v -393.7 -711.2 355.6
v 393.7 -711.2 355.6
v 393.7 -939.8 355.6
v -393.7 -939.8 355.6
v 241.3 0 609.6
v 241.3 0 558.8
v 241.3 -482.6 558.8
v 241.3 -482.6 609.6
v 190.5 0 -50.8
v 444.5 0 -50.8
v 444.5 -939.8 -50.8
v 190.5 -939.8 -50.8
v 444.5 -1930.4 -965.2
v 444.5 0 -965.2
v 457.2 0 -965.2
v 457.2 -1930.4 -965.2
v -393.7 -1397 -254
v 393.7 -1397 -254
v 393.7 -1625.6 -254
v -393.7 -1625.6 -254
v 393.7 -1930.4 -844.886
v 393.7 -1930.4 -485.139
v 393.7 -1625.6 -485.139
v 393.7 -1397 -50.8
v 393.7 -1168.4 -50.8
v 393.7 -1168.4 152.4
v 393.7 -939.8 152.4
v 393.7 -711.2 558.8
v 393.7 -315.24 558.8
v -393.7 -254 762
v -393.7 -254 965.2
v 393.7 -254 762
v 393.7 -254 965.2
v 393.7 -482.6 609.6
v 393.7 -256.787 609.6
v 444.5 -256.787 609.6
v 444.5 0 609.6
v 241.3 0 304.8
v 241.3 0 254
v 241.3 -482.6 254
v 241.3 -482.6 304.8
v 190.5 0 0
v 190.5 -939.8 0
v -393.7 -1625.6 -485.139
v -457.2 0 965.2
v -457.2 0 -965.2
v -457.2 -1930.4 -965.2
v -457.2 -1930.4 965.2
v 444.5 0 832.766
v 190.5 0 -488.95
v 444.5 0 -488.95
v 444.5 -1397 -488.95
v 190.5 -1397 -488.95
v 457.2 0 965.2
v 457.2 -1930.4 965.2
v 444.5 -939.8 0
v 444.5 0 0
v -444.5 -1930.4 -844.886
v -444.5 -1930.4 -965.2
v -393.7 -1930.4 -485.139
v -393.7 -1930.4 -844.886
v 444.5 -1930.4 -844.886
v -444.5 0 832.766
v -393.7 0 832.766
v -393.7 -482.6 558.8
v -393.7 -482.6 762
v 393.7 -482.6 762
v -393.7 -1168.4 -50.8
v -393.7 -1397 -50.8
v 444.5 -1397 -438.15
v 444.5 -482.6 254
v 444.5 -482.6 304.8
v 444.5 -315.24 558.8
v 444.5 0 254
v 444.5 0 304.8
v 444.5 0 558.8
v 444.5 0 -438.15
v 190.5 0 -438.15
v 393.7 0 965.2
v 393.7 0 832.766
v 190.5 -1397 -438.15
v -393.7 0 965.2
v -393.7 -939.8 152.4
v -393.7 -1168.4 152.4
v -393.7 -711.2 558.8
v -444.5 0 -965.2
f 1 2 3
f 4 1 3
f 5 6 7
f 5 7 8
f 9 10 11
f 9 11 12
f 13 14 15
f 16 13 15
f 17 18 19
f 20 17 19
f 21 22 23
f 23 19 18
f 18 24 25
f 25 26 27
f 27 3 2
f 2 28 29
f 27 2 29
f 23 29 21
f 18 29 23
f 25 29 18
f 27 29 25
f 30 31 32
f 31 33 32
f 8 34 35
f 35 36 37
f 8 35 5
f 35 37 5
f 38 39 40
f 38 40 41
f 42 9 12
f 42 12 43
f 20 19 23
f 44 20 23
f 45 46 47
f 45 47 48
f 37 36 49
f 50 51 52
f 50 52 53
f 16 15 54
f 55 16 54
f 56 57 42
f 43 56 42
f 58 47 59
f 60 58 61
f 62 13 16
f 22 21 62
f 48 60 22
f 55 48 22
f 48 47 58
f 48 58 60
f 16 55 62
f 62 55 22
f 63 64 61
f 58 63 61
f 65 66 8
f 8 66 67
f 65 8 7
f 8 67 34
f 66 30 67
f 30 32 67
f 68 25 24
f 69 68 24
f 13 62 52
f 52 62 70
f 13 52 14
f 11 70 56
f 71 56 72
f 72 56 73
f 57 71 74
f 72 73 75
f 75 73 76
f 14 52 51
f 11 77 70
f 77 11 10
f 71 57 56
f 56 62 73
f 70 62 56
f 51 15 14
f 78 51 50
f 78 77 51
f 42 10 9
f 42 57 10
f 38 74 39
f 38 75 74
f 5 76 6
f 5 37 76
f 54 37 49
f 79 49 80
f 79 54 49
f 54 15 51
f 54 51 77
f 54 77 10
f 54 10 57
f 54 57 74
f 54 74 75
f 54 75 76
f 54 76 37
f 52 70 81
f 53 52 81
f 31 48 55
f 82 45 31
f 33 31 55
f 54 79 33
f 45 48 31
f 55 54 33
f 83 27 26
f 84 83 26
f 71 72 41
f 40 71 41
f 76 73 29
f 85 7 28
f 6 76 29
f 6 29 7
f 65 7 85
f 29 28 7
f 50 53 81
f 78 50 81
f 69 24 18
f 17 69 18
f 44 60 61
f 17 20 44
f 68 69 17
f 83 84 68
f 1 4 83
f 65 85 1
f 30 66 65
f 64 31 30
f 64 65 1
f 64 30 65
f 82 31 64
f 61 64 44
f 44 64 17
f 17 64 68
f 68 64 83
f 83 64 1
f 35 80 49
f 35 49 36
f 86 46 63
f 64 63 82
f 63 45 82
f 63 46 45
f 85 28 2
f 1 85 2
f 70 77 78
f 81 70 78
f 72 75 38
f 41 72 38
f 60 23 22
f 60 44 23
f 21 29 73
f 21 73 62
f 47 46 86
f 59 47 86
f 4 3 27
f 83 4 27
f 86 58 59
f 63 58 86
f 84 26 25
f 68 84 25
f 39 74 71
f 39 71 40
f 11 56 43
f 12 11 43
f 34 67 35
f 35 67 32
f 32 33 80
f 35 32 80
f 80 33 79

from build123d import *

# Parameters (mm, degrees)
F0_W          = 914.4
F0_H          = 1930.4
F1_DEPTH      = 1930.4
F3_DEPTH      = 393.7
F3_DEPTH_BACK = 393.7
F5_DEPTH      = 444.5
F5_DEPTH_BACK = 444.5
F6_W          = 254
F6_H          = 50.8
F6_W_2        = 203.2
F7_DEPTH      = 482.6
F8_W          = 254
F8_H          = 50.8
F9_DEPTH      = 1397
F10_W         = 254
F10_H         = 50.8
F11_DEPTH     = 939.8


with BuildPart() as f1:
    # F0 (on Front) → F1 (new body)
    with BuildSketch(Plane.XZ):
        Rectangle(F0_W, F0_H)
    extrude(amount=F1_DEPTH)

    # F2 (on Right) → F3 (cut, two sides)
    with BuildSketch(Plane.YZ) as f3_sk:
        Polygon((81.8748995662, 971.9918370247), (-254, 965.2), (-254, 762), (-482.6, 762), (-482.6, 558.8), (-711.2, 558.8), (-711.2, 355.6), (-939.8, 355.6), (-939.8, 152.4), (-1168.4, 152.4), (-1168.4, -50.8), (-1397, -50.8), (-1397, -254), (-1625.6, -254), (-1625.6, -485.139220953), (-1930.4, -485.139220953), (-1930.4, -969.014108181), (215.3691798449, -969.014108181), align=None)
    extrude(amount=-F3_DEPTH, mode=Mode.SUBTRACT)
    extrude(f3_sk.sketch, amount=F3_DEPTH_BACK, mode=Mode.SUBTRACT)

    # F4 (on Right) → F5 (cut, two sides)
    with BuildSketch(Plane.YZ) as f5_sk:
        Polygon((233.0105304718, -1000.3662109375), (0, 832.7655792236), (-1940.5599832535, -853.7156581879), (-2034.8353385925, -1000.3662109375), align=None)
    extrude(amount=-F5_DEPTH, mode=Mode.SUBTRACT)
    extrude(f5_sk.sketch, amount=F5_DEPTH_BACK, mode=Mode.SUBTRACT)

    # F6 (on face) → F7 (join, through all)
    with BuildSketch(Plane(origin=(0, 0, 0), x_dir=(-1, 0, 0), z_dir=(0, 1, 0))):
        with Locations((-317.5, -463.55)):
            Rectangle(F6_W, F6_H)
        with Locations((-317.5, -25.4)):
            Rectangle(F6_W, F6_H)
        with Locations((-342.9, 279.4)):
            Rectangle(F6_W_2, F6_H)
        with Locations((-342.9, 584.2)):
            Rectangle(F6_W_2, F6_H)
    extrude(amount=-F7_DEPTH)

    # F8 (on face) → F9 (join, through all)
    with BuildSketch(Plane(origin=(0, 0, 0), x_dir=(-1, 0, 0), z_dir=(0, 1, 0))):
        with Locations((-317.5, -463.55)):
            Rectangle(F8_W, F8_H)
    extrude(amount=-F9_DEPTH)

    # F10 (on face) → F11 (join, through all)
    with BuildSketch(Plane(origin=(0, 0, 0), x_dir=(-1, 0, 0), z_dir=(0, 1, 0))):
        with Locations((-317.5, -25.4)):
            Rectangle(F10_W, F10_H)
    extrude(amount=-F11_DEPTH)


solid = f1.part
